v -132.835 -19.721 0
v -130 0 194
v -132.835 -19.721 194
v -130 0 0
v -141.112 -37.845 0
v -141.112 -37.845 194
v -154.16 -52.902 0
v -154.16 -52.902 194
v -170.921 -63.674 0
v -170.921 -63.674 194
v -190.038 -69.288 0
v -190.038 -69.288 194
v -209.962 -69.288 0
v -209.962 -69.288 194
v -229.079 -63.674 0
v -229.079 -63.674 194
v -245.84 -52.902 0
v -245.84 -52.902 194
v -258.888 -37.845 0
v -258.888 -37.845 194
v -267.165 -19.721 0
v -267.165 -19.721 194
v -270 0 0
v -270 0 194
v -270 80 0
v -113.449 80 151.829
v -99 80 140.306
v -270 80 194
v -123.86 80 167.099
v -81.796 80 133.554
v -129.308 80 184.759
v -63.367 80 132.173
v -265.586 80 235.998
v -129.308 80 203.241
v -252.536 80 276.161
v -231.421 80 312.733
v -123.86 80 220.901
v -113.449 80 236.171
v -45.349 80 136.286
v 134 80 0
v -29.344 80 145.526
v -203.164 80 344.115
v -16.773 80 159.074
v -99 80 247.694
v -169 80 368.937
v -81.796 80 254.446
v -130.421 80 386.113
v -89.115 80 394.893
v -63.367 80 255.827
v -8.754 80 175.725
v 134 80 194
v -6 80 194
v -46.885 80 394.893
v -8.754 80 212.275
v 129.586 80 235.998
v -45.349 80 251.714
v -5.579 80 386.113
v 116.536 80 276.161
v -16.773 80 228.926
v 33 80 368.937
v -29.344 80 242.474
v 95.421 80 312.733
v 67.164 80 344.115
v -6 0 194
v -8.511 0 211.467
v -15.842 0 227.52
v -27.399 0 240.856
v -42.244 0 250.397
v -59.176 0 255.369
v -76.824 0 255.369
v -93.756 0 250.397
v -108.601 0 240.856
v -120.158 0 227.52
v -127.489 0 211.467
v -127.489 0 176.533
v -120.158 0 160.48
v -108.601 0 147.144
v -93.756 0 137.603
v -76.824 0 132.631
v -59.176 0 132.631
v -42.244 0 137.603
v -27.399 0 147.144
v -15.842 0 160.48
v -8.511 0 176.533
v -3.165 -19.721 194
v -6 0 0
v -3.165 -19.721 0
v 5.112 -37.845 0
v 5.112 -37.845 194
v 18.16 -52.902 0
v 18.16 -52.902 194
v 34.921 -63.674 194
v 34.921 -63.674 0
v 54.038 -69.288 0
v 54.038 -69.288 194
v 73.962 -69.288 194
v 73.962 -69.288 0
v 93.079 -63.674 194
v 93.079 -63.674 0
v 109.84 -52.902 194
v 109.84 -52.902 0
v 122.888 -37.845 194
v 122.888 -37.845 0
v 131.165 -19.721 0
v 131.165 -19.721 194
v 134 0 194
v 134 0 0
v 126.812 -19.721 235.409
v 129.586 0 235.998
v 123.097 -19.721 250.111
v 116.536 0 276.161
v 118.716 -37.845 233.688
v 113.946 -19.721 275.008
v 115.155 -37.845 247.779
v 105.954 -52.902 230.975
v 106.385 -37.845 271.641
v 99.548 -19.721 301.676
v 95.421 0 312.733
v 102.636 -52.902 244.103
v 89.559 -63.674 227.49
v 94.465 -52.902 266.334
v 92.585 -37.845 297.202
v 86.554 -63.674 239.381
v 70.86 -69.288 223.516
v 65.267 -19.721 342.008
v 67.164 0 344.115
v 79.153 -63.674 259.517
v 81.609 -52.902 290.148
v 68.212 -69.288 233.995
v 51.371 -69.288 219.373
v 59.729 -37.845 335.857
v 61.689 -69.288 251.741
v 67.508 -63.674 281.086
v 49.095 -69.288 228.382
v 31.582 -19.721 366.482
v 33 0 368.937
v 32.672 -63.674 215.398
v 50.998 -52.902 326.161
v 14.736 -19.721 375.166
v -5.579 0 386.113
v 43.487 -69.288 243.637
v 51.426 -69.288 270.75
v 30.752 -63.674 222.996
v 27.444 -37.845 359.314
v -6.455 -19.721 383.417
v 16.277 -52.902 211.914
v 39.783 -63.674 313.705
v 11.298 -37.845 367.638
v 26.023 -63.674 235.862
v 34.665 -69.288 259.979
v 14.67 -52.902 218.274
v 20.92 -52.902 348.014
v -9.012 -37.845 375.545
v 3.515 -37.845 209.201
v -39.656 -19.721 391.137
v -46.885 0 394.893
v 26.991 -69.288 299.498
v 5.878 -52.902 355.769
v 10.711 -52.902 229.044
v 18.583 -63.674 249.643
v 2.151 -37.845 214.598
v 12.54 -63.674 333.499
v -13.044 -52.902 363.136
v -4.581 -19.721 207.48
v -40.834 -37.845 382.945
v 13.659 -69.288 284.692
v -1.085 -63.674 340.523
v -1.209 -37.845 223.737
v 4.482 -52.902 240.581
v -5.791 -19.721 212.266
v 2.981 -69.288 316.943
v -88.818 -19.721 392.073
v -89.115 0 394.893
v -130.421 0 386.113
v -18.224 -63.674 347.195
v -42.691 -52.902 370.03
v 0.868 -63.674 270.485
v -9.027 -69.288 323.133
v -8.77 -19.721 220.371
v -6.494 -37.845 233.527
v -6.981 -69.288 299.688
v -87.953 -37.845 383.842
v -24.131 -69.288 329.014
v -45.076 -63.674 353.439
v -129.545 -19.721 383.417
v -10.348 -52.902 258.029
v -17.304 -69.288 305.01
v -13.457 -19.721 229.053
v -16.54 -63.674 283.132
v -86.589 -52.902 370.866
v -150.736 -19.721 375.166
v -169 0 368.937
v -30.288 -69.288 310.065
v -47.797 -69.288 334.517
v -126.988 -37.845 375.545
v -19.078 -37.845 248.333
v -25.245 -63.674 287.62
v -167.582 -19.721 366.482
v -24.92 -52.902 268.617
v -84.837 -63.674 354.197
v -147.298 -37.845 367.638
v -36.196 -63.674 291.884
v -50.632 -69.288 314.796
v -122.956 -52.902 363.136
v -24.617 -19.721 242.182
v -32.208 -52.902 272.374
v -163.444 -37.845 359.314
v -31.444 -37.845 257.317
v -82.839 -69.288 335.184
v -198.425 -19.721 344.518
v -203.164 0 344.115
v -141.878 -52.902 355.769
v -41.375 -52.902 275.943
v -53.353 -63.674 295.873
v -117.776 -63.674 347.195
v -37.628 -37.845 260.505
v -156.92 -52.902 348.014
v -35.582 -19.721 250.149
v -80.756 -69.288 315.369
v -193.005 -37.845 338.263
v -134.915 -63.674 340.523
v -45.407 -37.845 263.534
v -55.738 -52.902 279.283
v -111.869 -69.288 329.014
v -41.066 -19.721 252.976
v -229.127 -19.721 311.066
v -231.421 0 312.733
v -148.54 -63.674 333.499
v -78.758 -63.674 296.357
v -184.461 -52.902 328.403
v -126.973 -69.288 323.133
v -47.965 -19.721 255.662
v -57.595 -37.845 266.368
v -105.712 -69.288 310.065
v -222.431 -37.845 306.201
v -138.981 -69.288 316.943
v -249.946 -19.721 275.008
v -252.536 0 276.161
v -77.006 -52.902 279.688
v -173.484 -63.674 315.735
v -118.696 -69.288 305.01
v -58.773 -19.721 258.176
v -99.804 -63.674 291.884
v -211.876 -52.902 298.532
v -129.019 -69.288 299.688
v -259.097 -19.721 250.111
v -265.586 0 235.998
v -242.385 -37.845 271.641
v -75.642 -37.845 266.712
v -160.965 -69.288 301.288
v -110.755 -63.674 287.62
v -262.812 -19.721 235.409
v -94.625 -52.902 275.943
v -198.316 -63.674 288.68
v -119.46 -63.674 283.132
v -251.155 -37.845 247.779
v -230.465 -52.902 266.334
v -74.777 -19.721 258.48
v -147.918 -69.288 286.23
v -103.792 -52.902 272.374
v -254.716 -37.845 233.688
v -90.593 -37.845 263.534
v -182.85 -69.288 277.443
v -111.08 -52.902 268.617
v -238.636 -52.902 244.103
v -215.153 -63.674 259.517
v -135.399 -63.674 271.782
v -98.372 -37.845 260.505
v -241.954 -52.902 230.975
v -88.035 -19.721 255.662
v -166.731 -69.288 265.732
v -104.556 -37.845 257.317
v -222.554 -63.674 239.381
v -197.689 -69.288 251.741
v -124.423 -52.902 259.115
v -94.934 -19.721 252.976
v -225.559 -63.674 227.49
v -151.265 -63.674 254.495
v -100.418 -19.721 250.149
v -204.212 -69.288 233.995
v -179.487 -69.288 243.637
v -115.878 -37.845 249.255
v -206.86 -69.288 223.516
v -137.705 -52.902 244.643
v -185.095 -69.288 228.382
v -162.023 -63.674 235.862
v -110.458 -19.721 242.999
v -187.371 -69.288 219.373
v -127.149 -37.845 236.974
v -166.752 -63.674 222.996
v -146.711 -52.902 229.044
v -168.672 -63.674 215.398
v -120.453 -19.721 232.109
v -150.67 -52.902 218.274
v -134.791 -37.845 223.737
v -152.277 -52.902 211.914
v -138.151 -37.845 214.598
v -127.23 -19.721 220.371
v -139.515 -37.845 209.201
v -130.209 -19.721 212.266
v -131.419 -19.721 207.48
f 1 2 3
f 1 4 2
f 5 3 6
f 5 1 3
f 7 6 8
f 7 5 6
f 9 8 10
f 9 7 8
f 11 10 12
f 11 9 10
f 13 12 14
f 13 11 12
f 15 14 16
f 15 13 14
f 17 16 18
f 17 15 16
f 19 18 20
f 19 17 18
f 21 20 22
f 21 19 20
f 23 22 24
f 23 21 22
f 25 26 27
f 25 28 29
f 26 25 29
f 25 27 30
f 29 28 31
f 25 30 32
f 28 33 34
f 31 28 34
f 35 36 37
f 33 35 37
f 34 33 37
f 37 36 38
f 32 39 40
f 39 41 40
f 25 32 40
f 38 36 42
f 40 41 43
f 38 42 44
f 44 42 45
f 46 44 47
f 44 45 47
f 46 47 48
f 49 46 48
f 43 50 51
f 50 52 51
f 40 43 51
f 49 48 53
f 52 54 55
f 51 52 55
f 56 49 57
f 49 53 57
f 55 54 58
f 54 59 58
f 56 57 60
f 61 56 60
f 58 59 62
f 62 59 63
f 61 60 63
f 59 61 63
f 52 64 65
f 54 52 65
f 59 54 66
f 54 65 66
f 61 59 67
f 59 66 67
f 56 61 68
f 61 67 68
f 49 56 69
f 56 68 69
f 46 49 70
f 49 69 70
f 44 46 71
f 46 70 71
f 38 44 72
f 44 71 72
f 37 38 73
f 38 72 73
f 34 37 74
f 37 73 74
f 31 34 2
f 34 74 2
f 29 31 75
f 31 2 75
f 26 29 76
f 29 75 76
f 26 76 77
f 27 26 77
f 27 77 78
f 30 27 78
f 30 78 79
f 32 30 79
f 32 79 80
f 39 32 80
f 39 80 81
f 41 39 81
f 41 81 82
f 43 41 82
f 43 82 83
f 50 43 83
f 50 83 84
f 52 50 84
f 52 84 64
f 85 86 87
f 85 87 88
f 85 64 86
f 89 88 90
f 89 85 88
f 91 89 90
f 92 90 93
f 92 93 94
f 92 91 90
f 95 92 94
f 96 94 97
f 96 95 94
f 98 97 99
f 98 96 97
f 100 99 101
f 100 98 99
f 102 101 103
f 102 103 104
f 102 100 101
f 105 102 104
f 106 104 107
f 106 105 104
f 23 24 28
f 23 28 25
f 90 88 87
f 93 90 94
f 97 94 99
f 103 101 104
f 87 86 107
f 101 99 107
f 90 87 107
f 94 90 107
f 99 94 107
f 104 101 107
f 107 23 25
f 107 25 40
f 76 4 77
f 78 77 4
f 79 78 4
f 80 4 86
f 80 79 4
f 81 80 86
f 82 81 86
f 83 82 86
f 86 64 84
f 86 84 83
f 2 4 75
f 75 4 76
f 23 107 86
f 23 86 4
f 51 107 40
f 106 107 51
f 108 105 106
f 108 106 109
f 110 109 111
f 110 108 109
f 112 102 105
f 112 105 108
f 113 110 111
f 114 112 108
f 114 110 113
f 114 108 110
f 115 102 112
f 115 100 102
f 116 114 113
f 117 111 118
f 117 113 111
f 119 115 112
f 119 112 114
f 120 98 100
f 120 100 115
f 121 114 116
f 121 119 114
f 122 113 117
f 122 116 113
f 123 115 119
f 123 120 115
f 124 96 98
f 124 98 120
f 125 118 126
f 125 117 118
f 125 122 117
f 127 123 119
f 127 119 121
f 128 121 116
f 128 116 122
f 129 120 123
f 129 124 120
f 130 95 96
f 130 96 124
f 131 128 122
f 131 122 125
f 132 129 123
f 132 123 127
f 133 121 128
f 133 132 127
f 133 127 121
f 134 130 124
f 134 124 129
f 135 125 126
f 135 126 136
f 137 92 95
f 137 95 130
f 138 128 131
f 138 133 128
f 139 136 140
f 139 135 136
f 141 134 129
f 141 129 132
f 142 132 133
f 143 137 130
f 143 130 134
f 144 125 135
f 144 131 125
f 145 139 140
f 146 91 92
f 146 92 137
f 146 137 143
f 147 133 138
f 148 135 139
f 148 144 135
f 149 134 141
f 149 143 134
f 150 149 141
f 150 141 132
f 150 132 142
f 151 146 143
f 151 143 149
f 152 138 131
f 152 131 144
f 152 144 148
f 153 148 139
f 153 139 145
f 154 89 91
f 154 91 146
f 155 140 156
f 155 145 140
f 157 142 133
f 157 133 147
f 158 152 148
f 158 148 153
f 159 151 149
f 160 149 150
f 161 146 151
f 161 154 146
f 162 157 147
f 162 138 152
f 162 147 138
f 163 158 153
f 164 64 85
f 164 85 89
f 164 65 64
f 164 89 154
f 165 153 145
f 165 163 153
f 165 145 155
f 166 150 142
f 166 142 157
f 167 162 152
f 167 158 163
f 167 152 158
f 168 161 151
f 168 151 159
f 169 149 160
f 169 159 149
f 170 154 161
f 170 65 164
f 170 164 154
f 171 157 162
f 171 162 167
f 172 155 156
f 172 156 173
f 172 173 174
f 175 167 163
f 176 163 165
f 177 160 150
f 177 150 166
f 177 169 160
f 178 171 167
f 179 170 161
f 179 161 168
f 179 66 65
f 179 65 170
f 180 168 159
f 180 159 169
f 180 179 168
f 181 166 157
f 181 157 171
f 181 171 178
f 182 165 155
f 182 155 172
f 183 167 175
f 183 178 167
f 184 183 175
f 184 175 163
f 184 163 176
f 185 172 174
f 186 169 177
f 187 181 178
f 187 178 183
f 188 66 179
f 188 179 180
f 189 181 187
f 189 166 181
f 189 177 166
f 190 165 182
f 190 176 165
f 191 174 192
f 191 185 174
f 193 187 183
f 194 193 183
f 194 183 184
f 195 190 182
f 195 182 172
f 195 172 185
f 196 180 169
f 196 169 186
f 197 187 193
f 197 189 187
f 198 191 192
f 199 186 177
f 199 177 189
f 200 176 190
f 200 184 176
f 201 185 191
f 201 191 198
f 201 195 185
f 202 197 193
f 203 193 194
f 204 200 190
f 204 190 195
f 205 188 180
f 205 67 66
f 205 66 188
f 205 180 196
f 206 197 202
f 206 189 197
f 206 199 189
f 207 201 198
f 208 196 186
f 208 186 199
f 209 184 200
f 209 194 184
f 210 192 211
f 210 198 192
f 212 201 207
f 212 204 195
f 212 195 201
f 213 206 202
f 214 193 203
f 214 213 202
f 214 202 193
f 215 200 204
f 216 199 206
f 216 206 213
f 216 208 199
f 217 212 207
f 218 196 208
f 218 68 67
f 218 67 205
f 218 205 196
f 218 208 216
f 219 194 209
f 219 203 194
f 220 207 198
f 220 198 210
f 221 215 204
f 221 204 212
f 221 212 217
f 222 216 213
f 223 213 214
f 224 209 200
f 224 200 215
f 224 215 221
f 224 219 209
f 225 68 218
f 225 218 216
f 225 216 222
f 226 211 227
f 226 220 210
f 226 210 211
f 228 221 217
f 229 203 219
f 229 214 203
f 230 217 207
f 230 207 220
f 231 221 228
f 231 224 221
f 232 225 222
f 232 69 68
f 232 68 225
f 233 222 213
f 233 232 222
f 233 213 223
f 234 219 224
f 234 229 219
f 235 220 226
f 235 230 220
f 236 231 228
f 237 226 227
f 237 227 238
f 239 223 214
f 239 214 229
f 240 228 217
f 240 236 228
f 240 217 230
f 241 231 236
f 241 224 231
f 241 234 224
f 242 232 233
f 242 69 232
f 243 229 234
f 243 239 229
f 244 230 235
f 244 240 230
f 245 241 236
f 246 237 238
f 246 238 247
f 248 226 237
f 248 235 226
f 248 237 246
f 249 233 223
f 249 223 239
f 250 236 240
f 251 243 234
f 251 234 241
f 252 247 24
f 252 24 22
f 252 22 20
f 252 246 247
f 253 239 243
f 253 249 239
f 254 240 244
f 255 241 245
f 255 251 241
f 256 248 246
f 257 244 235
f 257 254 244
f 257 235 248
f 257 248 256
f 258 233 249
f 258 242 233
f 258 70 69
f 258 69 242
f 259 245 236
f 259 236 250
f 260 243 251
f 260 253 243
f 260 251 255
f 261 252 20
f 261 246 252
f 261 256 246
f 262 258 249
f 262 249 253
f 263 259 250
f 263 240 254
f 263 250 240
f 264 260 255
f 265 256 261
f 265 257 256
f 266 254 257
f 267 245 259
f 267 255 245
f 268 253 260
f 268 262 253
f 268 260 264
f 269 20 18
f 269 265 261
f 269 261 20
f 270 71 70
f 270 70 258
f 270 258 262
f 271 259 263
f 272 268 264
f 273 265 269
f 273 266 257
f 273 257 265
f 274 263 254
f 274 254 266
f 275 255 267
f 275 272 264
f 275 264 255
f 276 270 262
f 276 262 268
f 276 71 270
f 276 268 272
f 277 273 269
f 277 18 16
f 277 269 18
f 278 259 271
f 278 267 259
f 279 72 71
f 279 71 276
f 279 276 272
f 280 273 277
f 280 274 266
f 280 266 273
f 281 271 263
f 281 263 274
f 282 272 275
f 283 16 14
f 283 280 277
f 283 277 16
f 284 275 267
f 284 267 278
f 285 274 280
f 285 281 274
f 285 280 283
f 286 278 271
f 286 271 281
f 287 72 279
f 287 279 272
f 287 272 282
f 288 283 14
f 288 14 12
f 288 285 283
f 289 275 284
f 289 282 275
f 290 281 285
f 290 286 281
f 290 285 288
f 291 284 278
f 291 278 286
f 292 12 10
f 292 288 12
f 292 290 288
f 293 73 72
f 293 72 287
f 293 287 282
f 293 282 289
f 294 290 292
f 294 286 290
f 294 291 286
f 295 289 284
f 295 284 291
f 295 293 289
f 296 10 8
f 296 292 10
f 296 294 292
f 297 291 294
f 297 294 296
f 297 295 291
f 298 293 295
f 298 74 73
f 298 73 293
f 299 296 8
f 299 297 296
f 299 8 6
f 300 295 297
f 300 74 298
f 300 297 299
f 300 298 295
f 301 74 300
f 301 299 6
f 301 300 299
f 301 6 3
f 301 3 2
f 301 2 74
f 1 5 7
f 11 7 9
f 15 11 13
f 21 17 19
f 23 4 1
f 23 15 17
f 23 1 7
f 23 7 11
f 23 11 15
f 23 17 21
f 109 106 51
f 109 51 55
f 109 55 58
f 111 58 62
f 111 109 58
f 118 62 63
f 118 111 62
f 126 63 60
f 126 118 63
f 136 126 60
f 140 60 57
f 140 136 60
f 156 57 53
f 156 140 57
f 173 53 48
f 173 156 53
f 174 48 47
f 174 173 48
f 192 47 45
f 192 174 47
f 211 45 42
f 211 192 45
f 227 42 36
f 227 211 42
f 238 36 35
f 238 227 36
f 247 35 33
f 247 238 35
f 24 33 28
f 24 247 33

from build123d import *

# Parameters (mm, degrees)
F1_R     = 70
F4_DEPTH = 80
F5_R     = 62
F6_DEPTH = 85
F7_W     = 435.71645
F7_H     = 77.360585
F8_DEPTH = 80


with BuildPart() as f3:
    # F3: sweep along a path in F0
    with BuildLine(Plane.XZ) as f3_path:
        Line((64, 0), (64, 194))
        ThreePointArc((64, 194), (-68, 326), (-200, 194))
        Line((-200, 194), (-200, 0))
    # F1 (on Top) → F3 (sweep)
    with BuildSketch(Plane.XY):
        with Locations((64, 0)):
            Circle(F1_R)
    sweep(path=f3_path.line)

    # F2 (on Front) → F4 (join)
    with BuildSketch(Plane.XZ):
        with BuildLine():
            Line((-270, 194), (134, 194))
            ThreePointArc((134, 194), (-68, 396), (-270, 194))
        make_face()
        with BuildLine():
            ThreePointArc((-270, 194), (-68, -8), (134, 194))
            Line((134, 194), (-270, 194))
        make_face()
        with BuildLine():
            Line((134, -18.768641), (134, 194))
            ThreePointArc((134, 194), (-68, -8), (-270, 194))
            Line((-270, 194), (-270, -18.768641))
            Line((-270, -18.768641), (134, -18.768641))
        make_face()
    extrude(amount=-F4_DEPTH)

    # F5 (on Front) → F6 (cut)
    with BuildSketch(Plane.XZ):
        with Locations((-68, 194)):
            Circle(F5_R)
    extrude(amount=-F6_DEPTH, mode=Mode.SUBTRACT)

    # F7 (on Front) → F8 (cut)
    with BuildSketch(Plane.XZ):
        with Locations((-63.542128, -38.680293)):
            Rectangle(F7_W, F7_H)
    extrude(amount=-F8_DEPTH, mode=Mode.SUBTRACT)


solid = f3.part
